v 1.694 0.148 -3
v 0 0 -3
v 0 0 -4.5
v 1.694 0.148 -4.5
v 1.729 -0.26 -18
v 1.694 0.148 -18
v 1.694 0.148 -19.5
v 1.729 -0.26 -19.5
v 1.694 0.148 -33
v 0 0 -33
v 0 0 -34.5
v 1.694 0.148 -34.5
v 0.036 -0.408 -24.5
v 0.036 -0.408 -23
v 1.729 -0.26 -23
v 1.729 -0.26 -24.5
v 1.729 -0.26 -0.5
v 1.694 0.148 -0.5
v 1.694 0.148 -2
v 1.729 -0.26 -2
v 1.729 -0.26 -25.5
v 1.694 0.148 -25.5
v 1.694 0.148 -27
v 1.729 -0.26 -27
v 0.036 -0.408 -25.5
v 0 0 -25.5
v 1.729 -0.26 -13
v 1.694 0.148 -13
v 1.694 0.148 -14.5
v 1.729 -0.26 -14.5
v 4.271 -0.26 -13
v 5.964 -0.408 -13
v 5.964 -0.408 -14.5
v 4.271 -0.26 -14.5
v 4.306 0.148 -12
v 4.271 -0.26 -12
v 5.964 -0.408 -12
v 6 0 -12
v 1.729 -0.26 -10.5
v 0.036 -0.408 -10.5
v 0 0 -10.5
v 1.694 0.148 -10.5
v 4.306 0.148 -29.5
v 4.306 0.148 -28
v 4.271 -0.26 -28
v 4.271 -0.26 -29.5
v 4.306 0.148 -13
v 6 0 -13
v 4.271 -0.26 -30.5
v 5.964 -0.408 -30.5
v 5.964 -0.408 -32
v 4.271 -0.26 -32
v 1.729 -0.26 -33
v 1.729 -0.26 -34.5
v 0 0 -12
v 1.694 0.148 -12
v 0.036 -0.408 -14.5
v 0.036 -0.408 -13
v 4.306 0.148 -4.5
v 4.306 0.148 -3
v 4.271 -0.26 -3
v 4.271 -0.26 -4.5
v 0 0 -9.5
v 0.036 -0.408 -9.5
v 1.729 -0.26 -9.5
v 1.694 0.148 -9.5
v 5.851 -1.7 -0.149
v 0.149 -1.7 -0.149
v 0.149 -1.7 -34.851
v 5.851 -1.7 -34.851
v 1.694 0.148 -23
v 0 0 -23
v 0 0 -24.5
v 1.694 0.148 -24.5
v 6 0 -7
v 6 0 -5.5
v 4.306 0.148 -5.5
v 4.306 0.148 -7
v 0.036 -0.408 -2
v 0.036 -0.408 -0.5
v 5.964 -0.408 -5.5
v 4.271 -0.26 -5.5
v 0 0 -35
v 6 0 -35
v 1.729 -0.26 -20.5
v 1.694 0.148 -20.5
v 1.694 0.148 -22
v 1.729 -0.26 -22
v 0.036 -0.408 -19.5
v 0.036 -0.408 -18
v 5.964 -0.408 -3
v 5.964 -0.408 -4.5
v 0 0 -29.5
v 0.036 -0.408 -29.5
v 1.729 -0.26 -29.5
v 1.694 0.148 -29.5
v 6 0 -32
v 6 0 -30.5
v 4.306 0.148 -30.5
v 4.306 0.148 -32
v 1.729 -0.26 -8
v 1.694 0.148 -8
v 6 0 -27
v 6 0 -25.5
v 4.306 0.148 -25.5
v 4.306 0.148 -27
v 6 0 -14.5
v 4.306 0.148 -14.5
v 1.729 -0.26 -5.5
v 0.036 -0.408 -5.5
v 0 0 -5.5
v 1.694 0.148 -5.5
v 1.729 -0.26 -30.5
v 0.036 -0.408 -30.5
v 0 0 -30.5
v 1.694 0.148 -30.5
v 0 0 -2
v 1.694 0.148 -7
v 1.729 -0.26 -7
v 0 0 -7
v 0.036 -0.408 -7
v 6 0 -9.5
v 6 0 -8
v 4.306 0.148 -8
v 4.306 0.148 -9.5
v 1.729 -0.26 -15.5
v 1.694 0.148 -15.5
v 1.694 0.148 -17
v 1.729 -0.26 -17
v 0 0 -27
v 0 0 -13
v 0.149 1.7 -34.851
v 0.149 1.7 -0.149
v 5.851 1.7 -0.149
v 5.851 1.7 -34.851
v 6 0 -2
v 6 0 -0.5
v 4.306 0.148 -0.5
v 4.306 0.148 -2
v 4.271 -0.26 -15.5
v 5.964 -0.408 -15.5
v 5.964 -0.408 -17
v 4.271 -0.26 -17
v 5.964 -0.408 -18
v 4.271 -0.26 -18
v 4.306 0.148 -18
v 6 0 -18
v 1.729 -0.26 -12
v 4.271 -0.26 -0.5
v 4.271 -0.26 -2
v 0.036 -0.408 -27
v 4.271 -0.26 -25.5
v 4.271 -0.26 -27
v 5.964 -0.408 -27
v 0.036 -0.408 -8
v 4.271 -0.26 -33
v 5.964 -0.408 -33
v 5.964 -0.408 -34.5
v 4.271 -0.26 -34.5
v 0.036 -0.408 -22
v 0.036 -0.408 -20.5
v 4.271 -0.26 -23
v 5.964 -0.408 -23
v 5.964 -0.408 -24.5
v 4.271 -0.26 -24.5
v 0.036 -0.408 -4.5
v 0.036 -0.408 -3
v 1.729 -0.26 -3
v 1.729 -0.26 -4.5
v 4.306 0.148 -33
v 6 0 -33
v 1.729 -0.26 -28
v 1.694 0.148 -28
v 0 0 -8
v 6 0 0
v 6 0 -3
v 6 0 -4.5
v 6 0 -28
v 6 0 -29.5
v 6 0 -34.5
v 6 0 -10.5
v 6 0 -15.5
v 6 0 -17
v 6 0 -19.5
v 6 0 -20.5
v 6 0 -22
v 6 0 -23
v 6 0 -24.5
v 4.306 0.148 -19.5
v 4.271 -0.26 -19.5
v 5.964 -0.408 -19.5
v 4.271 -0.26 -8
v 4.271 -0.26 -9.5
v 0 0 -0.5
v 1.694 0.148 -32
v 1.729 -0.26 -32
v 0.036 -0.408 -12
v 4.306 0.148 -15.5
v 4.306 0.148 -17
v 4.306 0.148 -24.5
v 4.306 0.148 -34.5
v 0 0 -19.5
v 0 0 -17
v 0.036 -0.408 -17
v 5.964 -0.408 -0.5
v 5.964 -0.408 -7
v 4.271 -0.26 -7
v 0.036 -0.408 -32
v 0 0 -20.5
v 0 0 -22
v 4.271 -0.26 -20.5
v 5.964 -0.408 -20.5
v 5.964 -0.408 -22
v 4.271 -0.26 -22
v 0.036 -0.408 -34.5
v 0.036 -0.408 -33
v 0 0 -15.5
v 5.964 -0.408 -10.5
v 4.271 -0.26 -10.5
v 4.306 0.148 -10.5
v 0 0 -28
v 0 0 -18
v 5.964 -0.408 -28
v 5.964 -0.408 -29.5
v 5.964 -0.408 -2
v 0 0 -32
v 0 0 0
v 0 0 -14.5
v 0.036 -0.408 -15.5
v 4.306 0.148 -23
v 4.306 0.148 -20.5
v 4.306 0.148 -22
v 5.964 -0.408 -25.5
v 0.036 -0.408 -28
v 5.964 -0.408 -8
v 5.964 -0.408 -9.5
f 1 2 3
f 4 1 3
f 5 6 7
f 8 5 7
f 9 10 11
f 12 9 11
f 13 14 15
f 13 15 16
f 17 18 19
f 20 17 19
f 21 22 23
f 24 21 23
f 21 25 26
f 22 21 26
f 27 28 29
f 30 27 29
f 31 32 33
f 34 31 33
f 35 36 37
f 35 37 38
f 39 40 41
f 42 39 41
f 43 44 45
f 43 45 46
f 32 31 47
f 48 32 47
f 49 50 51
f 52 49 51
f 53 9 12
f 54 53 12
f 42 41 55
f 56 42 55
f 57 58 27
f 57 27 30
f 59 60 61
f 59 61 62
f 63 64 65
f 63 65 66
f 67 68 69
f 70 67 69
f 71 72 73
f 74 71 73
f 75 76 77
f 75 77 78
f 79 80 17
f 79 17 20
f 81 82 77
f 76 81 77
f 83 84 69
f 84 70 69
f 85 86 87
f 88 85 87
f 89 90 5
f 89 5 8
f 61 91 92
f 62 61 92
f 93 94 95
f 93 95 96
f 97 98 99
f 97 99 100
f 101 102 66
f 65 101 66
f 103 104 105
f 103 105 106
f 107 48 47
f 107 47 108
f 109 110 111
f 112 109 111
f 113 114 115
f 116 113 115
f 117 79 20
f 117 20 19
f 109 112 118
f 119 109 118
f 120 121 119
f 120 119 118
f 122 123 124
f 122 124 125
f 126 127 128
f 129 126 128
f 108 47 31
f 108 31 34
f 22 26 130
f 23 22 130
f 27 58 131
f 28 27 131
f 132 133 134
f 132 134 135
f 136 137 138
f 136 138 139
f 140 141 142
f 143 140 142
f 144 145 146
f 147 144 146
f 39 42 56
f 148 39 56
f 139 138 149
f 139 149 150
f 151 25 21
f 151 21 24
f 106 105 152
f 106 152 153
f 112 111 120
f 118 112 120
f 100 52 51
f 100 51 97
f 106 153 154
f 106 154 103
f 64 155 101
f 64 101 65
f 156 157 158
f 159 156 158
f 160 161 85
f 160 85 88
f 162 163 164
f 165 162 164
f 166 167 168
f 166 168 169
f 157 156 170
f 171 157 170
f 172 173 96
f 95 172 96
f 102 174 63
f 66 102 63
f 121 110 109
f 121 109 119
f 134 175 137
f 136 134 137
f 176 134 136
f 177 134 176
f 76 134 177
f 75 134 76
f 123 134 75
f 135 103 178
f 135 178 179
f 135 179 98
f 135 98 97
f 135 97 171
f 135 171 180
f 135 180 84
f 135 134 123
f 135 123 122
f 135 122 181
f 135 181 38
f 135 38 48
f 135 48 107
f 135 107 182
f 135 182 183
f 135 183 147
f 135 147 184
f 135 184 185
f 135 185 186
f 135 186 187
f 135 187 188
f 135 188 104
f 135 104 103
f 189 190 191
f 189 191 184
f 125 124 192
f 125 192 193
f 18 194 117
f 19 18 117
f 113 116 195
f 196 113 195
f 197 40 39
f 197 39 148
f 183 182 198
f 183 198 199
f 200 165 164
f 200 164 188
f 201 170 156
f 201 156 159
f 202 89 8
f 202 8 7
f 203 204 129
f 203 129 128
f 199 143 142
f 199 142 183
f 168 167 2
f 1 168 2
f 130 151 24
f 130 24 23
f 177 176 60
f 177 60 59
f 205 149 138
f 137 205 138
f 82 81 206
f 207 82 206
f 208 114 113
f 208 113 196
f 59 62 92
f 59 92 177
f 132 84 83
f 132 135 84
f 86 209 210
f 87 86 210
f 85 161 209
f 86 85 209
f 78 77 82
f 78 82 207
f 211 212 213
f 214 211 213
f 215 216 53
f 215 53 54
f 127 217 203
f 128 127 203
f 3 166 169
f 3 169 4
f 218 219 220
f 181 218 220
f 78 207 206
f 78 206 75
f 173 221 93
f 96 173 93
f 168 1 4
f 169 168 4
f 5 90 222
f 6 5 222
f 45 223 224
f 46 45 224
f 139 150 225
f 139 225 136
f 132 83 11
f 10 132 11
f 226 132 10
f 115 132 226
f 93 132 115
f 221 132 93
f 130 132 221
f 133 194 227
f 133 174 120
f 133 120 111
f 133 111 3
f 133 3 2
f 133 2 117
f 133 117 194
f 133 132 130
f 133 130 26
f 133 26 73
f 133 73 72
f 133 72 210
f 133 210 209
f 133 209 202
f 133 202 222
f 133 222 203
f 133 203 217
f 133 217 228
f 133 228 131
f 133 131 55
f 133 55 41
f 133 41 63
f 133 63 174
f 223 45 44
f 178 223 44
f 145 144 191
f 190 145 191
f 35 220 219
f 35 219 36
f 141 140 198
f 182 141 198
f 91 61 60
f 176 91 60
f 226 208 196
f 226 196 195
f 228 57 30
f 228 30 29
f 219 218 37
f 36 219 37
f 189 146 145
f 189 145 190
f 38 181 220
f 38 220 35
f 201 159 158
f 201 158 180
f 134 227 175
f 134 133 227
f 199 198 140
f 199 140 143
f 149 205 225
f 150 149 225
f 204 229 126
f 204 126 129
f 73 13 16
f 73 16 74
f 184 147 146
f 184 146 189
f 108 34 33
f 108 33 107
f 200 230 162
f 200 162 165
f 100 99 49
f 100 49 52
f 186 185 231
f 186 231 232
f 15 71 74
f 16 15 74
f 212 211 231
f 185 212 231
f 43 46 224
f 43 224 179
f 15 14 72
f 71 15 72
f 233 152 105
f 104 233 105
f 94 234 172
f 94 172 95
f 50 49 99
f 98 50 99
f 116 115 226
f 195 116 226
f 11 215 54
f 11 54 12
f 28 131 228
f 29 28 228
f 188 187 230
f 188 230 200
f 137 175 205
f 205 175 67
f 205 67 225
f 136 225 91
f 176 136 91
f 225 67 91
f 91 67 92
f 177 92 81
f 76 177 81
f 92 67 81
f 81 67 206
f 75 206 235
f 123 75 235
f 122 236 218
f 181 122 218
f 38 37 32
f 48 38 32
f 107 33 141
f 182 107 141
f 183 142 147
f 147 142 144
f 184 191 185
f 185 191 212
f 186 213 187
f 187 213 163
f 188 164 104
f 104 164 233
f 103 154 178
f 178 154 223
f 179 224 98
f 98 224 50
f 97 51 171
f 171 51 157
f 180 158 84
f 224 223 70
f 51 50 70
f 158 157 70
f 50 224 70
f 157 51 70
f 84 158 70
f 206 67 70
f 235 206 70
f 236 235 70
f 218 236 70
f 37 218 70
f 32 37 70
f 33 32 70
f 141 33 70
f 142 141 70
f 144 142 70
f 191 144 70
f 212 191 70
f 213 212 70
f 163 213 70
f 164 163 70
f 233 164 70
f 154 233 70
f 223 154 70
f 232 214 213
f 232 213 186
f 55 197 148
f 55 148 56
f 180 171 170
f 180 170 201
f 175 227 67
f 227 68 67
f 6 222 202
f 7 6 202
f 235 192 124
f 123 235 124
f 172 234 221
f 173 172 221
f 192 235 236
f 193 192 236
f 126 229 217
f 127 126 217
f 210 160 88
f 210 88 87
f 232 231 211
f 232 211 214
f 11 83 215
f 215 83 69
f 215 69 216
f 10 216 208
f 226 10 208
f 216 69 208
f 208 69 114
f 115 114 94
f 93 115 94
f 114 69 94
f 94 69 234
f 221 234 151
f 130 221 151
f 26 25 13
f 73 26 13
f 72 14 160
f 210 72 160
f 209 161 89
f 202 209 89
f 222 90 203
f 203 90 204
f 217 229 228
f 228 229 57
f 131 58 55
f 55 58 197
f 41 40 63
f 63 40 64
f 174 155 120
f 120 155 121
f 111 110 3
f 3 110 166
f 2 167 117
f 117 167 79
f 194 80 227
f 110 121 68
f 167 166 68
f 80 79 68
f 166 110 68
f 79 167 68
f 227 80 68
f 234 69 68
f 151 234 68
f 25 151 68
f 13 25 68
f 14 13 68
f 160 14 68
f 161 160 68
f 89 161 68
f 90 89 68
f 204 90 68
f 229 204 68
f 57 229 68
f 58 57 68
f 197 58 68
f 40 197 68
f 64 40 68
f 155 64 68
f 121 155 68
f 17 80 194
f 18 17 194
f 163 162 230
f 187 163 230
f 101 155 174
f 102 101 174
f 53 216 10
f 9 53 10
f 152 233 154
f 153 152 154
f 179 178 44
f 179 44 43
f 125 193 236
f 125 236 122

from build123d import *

# Parameters (mm, degrees)
SKETCH1_W                     = 6
SKETCH1_H                     = 35
BOSS_EXTRUDE1_DEPTH           = 1.7
BOSS_EXTRUDE1_TAPER           = 5
BOSS_EXTRUDE1_OTHER_WAY_DEPTH = 1.7
BOSS_EXTRUDE1_OTHER_WAY_TAPER = 5
SKETCH2_W                     = 1.5
SKETCH2_H                     = 0.41
CUT_EXTRUDE1_DEPTH            = 1.7


with BuildPart() as part:
    # Sketch1 → Boss-Extrude1 (new body)
    with BuildSketch(Plane(origin=(0, 0, 0), x_dir=(1, 0, 0), z_dir=(0, 1, 0))):
        with Locations((3, 17.5)):
            Rectangle(SKETCH1_W, SKETCH1_H)
    extrude(amount=BOSS_EXTRUDE1_DEPTH, taper=BOSS_EXTRUDE1_TAPER)

    # Sketch1 → Boss-Extrude1 other way (add)
    with BuildSketch(Plane(origin=(0, 0, 0), x_dir=(1, 0, 0), z_dir=(0, 1, 0))):
        with Locations((3, 17.5)):
            Rectangle(SKETCH1_W, SKETCH1_H)
    extrude(amount=-BOSS_EXTRUDE1_OTHER_WAY_DEPTH, taper=BOSS_EXTRUDE1_OTHER_WAY_TAPER)

    # Sketch2 → Cut-Extrude1 (cut)
    with BuildSketch(Plane(origin=(5.954423259, -0.520944533, 0), x_dir=(0, 0, -1), z_dir=(0.996194698, -0.087155743, 0))):
        with Locations((1.25, 0.317934456)):
            Rectangle(SKETCH2_W, SKETCH2_H)
        with Locations((3.75, 0.317934456)):
            Rectangle(SKETCH2_W, SKETCH2_H)
        with Locations((6.25, 0.317934456)):
            Rectangle(SKETCH2_W, SKETCH2_H)
        with Locations((8.75, 0.317934456)):
            Rectangle(SKETCH2_W, SKETCH2_H)
        with Locations((11.25, 0.317934456)):
            Rectangle(SKETCH2_W, SKETCH2_H)
        with Locations((13.75, 0.317934456)):
            Rectangle(SKETCH2_W, SKETCH2_H)
        with Locations((16.25, 0.317934456)):
            Rectangle(SKETCH2_W, SKETCH2_H)
        with Locations((18.75, 0.317934456)):
            Rectangle(SKETCH2_W, SKETCH2_H)
        with Locations((21.25, 0.317934456)):
            Rectangle(SKETCH2_W, SKETCH2_H)
        with Locations((23.75, 0.317934456)):
            Rectangle(SKETCH2_W, SKETCH2_H)
        with Locations((26.25, 0.317934456)):
            Rectangle(SKETCH2_W, SKETCH2_H)
        with Locations((28.75, 0.317934456)):
            Rectangle(SKETCH2_W, SKETCH2_H)
        with Locations((31.25, 0.317934456)):
            Rectangle(SKETCH2_W, SKETCH2_H)
        with Locations((33.75, 0.317934456)):
            Rectangle(SKETCH2_W, SKETCH2_H)
    cut_extrude1 = extrude(amount=-CUT_EXTRUDE1_DEPTH, mode=Mode.SUBTRACT)

    # Mirror1: Cut-Extrude1 across plane
    add(cut_extrude1.mirror(Plane(origin=(3, 0, 0), x_dir=(0, 0, 1), z_dir=(1, 0, 0))), mode=Mode.SUBTRACT)


solid = part.part
